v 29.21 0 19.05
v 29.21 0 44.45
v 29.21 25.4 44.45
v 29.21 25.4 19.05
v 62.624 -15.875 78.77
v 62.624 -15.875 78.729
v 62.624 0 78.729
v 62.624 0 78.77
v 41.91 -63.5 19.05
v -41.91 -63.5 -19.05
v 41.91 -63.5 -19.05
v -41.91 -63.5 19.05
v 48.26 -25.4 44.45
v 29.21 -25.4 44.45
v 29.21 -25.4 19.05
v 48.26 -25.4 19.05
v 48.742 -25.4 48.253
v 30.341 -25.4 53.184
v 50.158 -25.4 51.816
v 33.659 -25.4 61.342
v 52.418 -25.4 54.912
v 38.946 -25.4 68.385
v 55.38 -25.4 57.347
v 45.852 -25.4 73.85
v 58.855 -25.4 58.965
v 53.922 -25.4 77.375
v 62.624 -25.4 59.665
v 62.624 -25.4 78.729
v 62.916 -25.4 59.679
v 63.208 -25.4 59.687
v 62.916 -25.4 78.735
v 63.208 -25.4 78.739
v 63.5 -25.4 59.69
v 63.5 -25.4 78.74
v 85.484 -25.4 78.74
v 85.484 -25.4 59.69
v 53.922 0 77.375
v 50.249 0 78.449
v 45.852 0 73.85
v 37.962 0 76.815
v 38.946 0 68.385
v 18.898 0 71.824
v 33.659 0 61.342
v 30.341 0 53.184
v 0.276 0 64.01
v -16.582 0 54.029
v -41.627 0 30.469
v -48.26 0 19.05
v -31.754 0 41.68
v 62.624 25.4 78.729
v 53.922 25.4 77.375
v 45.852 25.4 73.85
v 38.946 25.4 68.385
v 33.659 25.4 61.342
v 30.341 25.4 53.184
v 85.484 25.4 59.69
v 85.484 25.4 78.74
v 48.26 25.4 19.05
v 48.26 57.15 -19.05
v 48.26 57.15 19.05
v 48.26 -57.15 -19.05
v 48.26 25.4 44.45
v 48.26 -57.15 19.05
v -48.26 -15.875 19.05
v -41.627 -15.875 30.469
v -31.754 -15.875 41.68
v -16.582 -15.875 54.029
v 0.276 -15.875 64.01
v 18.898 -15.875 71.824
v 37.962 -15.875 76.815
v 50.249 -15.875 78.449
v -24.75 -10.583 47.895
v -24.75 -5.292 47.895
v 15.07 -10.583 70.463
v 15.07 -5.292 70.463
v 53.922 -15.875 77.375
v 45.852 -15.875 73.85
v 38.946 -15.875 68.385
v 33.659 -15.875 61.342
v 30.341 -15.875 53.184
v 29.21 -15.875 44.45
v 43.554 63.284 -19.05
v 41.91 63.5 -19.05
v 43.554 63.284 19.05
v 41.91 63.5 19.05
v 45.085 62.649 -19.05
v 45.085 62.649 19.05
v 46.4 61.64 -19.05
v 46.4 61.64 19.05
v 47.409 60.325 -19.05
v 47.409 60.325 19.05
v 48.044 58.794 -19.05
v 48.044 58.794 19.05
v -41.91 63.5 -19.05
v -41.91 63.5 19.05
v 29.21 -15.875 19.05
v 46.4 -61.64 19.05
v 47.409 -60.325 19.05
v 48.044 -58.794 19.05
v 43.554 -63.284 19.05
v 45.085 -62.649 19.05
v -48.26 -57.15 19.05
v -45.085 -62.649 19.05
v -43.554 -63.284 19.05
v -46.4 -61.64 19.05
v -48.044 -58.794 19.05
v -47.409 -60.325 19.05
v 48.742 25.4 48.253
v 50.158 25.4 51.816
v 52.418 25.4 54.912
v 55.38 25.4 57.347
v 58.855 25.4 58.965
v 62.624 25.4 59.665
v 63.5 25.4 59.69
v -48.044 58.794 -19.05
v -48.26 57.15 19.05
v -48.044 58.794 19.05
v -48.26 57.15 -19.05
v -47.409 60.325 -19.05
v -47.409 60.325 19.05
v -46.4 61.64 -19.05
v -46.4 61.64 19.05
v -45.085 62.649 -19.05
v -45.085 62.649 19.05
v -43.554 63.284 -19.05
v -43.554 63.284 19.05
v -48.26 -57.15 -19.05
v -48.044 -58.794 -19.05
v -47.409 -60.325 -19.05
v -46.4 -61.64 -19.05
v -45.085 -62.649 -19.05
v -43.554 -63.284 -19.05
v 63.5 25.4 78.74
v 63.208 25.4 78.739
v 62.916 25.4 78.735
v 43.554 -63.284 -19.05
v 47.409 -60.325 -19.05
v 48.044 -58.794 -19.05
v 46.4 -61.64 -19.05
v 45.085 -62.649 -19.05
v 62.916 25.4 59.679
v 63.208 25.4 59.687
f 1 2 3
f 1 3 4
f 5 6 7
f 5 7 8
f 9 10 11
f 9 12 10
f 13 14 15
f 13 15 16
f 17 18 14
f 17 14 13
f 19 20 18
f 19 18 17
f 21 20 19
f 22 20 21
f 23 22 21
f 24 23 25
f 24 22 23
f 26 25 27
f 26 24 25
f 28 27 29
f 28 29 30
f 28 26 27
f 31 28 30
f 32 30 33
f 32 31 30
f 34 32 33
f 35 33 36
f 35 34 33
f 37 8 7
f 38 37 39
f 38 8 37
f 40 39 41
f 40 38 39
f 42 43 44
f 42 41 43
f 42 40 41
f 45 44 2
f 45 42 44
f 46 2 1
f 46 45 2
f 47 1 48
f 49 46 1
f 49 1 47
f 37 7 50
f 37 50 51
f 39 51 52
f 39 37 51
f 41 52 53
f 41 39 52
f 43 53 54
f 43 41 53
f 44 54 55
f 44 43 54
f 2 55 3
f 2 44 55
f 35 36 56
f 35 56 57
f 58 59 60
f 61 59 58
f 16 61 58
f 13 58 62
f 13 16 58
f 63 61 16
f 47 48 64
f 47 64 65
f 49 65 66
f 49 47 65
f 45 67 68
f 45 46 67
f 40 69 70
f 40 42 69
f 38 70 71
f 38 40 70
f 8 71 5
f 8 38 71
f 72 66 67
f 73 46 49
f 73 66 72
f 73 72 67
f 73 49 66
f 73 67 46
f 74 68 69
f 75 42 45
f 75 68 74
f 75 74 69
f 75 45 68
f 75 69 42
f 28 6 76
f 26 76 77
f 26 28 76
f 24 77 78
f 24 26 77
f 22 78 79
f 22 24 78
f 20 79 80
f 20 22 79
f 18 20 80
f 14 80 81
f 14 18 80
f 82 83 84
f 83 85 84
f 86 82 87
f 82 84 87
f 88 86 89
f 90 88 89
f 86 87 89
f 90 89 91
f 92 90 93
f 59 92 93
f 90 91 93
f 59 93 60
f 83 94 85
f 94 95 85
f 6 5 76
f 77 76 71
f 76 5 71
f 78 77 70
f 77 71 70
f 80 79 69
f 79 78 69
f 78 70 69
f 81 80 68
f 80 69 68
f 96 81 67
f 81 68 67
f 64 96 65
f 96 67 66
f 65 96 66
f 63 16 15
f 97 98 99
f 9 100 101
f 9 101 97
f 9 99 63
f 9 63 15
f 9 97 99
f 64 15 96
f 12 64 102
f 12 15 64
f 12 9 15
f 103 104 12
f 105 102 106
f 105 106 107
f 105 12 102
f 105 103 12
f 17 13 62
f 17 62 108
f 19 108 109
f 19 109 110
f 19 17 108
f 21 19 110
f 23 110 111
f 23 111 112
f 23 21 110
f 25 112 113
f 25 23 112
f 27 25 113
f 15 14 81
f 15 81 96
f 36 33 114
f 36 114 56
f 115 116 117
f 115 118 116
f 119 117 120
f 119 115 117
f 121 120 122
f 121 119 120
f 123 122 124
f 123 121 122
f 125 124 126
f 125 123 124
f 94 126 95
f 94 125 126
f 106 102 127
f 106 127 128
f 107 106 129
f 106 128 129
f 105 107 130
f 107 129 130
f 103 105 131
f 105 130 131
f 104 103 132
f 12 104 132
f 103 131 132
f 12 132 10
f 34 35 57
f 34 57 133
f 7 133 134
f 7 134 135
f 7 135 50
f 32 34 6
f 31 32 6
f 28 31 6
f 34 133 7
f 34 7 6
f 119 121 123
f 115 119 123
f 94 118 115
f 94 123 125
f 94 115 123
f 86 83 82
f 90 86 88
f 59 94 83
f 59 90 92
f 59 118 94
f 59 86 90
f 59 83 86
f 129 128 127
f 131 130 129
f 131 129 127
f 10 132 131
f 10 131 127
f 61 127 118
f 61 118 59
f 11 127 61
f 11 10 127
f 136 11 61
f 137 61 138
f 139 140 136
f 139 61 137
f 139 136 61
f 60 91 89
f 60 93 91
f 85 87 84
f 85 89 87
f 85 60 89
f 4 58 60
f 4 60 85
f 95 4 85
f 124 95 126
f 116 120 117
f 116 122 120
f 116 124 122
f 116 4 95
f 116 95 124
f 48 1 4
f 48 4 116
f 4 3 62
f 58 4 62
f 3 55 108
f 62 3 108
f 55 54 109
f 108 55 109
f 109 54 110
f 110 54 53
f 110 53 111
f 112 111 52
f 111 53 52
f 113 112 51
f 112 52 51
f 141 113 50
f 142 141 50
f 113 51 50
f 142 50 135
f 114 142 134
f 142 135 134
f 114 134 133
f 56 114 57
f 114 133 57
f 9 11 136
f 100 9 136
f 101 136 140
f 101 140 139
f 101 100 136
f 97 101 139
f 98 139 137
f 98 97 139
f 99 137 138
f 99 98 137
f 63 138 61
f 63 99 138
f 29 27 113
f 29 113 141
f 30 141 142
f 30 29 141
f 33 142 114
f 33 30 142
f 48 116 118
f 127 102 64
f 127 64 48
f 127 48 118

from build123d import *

# Parameters (mm, degrees)
F1_DEPTH = 63.5
F2_DEPTH = 25.4
F3_DEPTH = 15.875
F4_R     = 6.35


with BuildPart() as f1:
    # F0 (on Front) → F1 (new body, symmetric)
    with BuildSketch(Plane.XZ):
        Polygon((29.21, 19.05), (-48.26, 19.05), (-48.26, -19.05), (48.26, -19.05), (48.26, 19.05), align=None)
    extrude(amount=F1_DEPTH, both=True)

    # F0 (on Front) → F2 (join, symmetric)
    with BuildSketch(Plane.XZ):
        with BuildLine():
            Line((29.21, 44.45), (29.21, 19.05))
            Line((29.21, 19.05), (48.26, 19.05))
            Line((48.26, 19.05), (48.26, 44.45))
            ThreePointArc((48.26, 44.45), (52.418442, 54.912154), (62.624393, 59.664825))
            Line((62.624393, 59.664825), (62.624393, 78.728819))
            ThreePointArc((62.624393, 78.728819), (38.945686, 68.385116), (29.21, 44.45))
        make_face()
        with BuildLine():
            ThreePointArc((63.5, 78.74), (63.062161, 78.737205), (62.624393, 78.728819))
            Line((62.624393, 78.728819), (62.624393, 59.664825))
            ThreePointArc((62.624393, 59.664825), (63.062016, 59.683705), (63.5, 59.69))
            Line((63.5, 59.69), (85.484393, 59.69))
            Line((85.484393, 59.69), (85.484393, 78.74))
            Line((85.484393, 78.74), (63.5, 78.74))
        make_face()
    extrude(amount=F2_DEPTH, both=True)

    # F0 (on Front) → F3 (join)
    with BuildSketch(Plane.XZ):
        with BuildLine():
            add(Edge.make_bspline(
                [(-48.26, 19.05), (-35.762786, 48.370969), (14.062008, 80.255039), (62.624393, 78.770398)],
                knots=[0, 0, 0, 0, 125.944125, 125.944125, 125.944125, 125.944125], degree=3))
            Line((-48.26, 19.05), (29.21, 19.05))
            Line((29.21, 19.05), (29.21, 44.45))
            ThreePointArc((29.21, 44.45), (38.945686, 68.385116), (62.624393, 78.728819))
            Line((62.624393, 78.728819), (62.624393, 78.770398))
        make_face()
    extrude(amount=F3_DEPTH)

    # F4
    f4_edges = [f1.edges().sort_by_distance(p)[0] for p in [
        (48.26, -63.5, 0),
        (-48.26, -63.5, 0),
        (48.26, 63.5, 0),
        (-48.26, 63.5, 0),
    ]]
    fillet(f4_edges, radius=F4_R)


solid = f1.part
